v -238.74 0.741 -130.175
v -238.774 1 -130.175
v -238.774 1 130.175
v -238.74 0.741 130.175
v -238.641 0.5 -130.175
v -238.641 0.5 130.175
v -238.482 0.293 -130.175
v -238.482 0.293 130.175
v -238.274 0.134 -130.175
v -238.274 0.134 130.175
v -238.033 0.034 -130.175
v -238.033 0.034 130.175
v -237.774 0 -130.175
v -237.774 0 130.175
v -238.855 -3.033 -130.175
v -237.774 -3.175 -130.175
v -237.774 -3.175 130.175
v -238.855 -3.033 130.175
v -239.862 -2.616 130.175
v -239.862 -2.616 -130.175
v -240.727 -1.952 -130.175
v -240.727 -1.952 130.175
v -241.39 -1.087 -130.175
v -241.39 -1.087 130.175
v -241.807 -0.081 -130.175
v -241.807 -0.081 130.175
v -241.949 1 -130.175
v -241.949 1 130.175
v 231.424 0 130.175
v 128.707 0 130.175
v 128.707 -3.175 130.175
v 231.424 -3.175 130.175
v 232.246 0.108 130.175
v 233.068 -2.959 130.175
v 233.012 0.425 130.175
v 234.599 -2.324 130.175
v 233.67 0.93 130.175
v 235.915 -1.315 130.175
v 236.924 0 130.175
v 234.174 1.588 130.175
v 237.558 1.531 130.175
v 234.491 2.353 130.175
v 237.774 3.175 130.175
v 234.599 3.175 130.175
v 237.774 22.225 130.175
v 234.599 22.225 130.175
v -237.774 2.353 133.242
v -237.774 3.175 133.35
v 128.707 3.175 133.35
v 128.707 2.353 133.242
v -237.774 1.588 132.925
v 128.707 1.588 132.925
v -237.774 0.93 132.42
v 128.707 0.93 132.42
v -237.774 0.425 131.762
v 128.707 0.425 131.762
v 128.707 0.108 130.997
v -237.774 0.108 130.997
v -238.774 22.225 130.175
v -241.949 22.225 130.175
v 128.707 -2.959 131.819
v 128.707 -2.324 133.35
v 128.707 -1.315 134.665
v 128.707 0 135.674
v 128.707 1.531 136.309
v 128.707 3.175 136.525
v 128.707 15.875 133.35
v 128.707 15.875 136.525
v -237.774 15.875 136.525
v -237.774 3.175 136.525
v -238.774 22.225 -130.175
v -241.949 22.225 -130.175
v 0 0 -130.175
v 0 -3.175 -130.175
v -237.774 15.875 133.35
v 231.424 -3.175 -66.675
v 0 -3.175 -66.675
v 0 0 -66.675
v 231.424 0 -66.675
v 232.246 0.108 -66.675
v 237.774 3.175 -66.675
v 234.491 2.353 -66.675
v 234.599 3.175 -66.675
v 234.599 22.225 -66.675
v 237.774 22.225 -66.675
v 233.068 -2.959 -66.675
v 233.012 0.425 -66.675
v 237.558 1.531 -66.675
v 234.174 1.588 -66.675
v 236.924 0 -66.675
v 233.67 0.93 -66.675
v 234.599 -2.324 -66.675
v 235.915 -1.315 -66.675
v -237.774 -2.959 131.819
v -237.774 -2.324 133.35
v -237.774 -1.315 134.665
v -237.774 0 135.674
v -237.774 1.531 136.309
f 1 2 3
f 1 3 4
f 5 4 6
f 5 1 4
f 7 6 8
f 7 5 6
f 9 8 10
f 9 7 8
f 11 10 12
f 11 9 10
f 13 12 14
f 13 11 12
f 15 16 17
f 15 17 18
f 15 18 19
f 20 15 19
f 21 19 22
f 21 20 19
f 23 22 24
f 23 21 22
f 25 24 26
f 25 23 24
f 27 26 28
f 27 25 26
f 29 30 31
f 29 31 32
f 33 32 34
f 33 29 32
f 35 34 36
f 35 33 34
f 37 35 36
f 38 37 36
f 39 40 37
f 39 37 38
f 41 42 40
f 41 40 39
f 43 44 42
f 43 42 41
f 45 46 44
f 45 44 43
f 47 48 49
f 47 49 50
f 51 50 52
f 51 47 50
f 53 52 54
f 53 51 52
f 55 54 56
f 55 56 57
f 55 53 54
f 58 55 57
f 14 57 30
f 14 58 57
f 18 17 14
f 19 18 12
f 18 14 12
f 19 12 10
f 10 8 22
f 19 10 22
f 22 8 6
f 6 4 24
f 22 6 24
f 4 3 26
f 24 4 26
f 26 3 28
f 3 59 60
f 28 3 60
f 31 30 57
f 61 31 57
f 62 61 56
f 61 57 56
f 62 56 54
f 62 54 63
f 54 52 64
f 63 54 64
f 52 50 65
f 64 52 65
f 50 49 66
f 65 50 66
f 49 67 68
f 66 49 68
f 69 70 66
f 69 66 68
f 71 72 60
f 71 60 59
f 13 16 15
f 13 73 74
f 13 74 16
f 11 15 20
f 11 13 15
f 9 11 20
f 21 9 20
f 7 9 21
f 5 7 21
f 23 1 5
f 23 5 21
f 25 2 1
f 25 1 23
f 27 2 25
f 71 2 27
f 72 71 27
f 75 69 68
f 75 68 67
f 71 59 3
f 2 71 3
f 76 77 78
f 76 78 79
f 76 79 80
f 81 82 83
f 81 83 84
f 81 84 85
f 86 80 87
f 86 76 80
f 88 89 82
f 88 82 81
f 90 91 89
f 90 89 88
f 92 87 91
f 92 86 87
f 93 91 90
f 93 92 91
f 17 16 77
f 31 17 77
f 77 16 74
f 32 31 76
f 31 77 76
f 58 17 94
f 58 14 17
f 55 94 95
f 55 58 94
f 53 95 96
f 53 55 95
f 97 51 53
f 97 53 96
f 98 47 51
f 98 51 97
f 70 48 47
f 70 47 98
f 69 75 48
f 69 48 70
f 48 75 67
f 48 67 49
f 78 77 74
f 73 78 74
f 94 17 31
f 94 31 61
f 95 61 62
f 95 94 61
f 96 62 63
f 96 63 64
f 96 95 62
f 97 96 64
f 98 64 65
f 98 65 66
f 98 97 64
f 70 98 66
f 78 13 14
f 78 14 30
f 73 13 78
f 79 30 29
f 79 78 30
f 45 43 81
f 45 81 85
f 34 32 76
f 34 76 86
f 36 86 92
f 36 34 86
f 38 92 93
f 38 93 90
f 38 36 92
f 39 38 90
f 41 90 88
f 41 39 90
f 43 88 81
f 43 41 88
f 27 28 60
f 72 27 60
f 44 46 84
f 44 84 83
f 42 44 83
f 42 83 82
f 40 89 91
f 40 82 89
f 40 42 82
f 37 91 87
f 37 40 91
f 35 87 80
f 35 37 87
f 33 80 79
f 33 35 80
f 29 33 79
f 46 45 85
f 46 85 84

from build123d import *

# Parameters (mm, degrees)
SKETCH5_W                    = 475.54896
SKETCH5_H                    = 260.35
BASE_FLANGE1_DEPTH           = 3.175
EDGE_FLANGE1_DEPTH           = 366.48136
EDGE_FLANGE2_STRIP_W         = 19.05
EDGE_FLANGE2_STRIP_H         = 3.175
EDGE_FLANGE2_STRIP_CUT_DEPTH = 260.35
EDGE_FLANGE2_DEPTH           = 260.35
EDGE_FLANGE3_DEPTH           = 260.35
CUT_EXTRUDE1_DEPTH           = 279.698003441
CUT_EXTRUDE1_DEPTH_BACK      = 279.698003441
SKETCH16_W                   = 336.938395151
SKETCH16_H                   = 122.280894257


# Sheet-metal steps are written as plain solids
with BuildPart() as part:
    # Sketch5 → Base-Flange1 (new body)
    with BuildSketch(Plane(origin=(0, 0, 0), x_dir=(1, 0, 0), z_dir=(0, 1, 0))):
        Rectangle(SKETCH5_W, SKETCH5_H)
    extrude(amount=-BASE_FLANGE1_DEPTH)

    # Edge-Flange1 section (across the edge) → Edge-Flange1 (add)
    with BuildSketch(Plane(origin=(-237.77448, 0, 133.35), x_dir=(0, 0, -1), z_dir=(1, 0, 0))):
        with BuildLine():
            Line((-3.175, 3.175), (-3.175, 15.875))
            Line((-3.175, 15.875), (0, 15.875))
            Line((0, 15.875), (0, 3.175))
            ThreePointArc((0, 3.175), (0.92993597, 0.92993597), (3.175, 0))
            Line((3.175, 0), (3.175, -3.175))
            ThreePointArc((3.175, -3.175), (-1.315128061, -1.315128061), (-3.175, 3.175))
        make_face()
    extrude(amount=EDGE_FLANGE1_DEPTH)

    # Edge-Flange2 strip (across the edge) → Edge-Flange2 strip cut (cut)
    with BuildSketch(Plane(origin=(237.77448, 0, 130.175), x_dir=(-1, 0, 0), z_dir=(0, 0, -1))):
        with Locations((-3.175, -1.5875)):
            Rectangle(EDGE_FLANGE2_STRIP_W, EDGE_FLANGE2_STRIP_H)
    extrude(amount=EDGE_FLANGE2_STRIP_CUT_DEPTH, mode=Mode.SUBTRACT)

    # Edge-Flange2 section (across the edge) → Edge-Flange2 (add)
    with BuildSketch(Plane(origin=(237.77448, 0, 130.175), x_dir=(-1, 0, 0), z_dir=(0, 0, -1))):
        with BuildLine():
            Line((0, 3.175), (0, 22.225))
            Line((0, 22.225), (3.175, 22.225))
            Line((3.175, 22.225), (3.175, 3.175))
            ThreePointArc((3.175, 3.175), (4.10493597, 0.92993597), (6.35, 0))
            Line((6.35, 0), (6.35, -3.175))
            ThreePointArc((6.35, -3.175), (1.859871939, -1.315128061), (0, 3.175))
        make_face()
    extrude(amount=EDGE_FLANGE2_DEPTH)

    # Edge-Flange3 section (across the edge) → Edge-Flange3 (add)
    with BuildSketch(Plane(origin=(-238.77448, 0, -130.175), x_dir=(1, 0, 0), z_dir=(0, 0, 1))):
        with BuildLine():
            Line((-3.175, 1), (-3.175, 22.225))
            Line((-3.175, 22.225), (0, 22.225))
            Line((0, 22.225), (0, 1))
            ThreePointArc((0, 1), (0.292893219, 0.292893219), (1, 0))
            Line((1, 0), (1, -3.175))
            ThreePointArc((1, -3.175), (-1.952170811, -1.952170811), (-3.175, 1))
        make_face()
    extrude(amount=EDGE_FLANGE3_DEPTH)

    # Sketch16 → Cut-Extrude1 (cut, two sides: drawn at the far end of the back side and taken through both)
    with BuildSketch(Plane(origin=(0, 0, 0), x_dir=(1, 0, 0), z_dir=(0, 1, 0)).offset(-CUT_EXTRUDE1_DEPTH_BACK)):
        with Locations((168.469197576, 127.815447129)):
            Rectangle(SKETCH16_W, SKETCH16_H)
    extrude(amount=CUT_EXTRUDE1_DEPTH + CUT_EXTRUDE1_DEPTH_BACK, mode=Mode.SUBTRACT)


solid = part.part
